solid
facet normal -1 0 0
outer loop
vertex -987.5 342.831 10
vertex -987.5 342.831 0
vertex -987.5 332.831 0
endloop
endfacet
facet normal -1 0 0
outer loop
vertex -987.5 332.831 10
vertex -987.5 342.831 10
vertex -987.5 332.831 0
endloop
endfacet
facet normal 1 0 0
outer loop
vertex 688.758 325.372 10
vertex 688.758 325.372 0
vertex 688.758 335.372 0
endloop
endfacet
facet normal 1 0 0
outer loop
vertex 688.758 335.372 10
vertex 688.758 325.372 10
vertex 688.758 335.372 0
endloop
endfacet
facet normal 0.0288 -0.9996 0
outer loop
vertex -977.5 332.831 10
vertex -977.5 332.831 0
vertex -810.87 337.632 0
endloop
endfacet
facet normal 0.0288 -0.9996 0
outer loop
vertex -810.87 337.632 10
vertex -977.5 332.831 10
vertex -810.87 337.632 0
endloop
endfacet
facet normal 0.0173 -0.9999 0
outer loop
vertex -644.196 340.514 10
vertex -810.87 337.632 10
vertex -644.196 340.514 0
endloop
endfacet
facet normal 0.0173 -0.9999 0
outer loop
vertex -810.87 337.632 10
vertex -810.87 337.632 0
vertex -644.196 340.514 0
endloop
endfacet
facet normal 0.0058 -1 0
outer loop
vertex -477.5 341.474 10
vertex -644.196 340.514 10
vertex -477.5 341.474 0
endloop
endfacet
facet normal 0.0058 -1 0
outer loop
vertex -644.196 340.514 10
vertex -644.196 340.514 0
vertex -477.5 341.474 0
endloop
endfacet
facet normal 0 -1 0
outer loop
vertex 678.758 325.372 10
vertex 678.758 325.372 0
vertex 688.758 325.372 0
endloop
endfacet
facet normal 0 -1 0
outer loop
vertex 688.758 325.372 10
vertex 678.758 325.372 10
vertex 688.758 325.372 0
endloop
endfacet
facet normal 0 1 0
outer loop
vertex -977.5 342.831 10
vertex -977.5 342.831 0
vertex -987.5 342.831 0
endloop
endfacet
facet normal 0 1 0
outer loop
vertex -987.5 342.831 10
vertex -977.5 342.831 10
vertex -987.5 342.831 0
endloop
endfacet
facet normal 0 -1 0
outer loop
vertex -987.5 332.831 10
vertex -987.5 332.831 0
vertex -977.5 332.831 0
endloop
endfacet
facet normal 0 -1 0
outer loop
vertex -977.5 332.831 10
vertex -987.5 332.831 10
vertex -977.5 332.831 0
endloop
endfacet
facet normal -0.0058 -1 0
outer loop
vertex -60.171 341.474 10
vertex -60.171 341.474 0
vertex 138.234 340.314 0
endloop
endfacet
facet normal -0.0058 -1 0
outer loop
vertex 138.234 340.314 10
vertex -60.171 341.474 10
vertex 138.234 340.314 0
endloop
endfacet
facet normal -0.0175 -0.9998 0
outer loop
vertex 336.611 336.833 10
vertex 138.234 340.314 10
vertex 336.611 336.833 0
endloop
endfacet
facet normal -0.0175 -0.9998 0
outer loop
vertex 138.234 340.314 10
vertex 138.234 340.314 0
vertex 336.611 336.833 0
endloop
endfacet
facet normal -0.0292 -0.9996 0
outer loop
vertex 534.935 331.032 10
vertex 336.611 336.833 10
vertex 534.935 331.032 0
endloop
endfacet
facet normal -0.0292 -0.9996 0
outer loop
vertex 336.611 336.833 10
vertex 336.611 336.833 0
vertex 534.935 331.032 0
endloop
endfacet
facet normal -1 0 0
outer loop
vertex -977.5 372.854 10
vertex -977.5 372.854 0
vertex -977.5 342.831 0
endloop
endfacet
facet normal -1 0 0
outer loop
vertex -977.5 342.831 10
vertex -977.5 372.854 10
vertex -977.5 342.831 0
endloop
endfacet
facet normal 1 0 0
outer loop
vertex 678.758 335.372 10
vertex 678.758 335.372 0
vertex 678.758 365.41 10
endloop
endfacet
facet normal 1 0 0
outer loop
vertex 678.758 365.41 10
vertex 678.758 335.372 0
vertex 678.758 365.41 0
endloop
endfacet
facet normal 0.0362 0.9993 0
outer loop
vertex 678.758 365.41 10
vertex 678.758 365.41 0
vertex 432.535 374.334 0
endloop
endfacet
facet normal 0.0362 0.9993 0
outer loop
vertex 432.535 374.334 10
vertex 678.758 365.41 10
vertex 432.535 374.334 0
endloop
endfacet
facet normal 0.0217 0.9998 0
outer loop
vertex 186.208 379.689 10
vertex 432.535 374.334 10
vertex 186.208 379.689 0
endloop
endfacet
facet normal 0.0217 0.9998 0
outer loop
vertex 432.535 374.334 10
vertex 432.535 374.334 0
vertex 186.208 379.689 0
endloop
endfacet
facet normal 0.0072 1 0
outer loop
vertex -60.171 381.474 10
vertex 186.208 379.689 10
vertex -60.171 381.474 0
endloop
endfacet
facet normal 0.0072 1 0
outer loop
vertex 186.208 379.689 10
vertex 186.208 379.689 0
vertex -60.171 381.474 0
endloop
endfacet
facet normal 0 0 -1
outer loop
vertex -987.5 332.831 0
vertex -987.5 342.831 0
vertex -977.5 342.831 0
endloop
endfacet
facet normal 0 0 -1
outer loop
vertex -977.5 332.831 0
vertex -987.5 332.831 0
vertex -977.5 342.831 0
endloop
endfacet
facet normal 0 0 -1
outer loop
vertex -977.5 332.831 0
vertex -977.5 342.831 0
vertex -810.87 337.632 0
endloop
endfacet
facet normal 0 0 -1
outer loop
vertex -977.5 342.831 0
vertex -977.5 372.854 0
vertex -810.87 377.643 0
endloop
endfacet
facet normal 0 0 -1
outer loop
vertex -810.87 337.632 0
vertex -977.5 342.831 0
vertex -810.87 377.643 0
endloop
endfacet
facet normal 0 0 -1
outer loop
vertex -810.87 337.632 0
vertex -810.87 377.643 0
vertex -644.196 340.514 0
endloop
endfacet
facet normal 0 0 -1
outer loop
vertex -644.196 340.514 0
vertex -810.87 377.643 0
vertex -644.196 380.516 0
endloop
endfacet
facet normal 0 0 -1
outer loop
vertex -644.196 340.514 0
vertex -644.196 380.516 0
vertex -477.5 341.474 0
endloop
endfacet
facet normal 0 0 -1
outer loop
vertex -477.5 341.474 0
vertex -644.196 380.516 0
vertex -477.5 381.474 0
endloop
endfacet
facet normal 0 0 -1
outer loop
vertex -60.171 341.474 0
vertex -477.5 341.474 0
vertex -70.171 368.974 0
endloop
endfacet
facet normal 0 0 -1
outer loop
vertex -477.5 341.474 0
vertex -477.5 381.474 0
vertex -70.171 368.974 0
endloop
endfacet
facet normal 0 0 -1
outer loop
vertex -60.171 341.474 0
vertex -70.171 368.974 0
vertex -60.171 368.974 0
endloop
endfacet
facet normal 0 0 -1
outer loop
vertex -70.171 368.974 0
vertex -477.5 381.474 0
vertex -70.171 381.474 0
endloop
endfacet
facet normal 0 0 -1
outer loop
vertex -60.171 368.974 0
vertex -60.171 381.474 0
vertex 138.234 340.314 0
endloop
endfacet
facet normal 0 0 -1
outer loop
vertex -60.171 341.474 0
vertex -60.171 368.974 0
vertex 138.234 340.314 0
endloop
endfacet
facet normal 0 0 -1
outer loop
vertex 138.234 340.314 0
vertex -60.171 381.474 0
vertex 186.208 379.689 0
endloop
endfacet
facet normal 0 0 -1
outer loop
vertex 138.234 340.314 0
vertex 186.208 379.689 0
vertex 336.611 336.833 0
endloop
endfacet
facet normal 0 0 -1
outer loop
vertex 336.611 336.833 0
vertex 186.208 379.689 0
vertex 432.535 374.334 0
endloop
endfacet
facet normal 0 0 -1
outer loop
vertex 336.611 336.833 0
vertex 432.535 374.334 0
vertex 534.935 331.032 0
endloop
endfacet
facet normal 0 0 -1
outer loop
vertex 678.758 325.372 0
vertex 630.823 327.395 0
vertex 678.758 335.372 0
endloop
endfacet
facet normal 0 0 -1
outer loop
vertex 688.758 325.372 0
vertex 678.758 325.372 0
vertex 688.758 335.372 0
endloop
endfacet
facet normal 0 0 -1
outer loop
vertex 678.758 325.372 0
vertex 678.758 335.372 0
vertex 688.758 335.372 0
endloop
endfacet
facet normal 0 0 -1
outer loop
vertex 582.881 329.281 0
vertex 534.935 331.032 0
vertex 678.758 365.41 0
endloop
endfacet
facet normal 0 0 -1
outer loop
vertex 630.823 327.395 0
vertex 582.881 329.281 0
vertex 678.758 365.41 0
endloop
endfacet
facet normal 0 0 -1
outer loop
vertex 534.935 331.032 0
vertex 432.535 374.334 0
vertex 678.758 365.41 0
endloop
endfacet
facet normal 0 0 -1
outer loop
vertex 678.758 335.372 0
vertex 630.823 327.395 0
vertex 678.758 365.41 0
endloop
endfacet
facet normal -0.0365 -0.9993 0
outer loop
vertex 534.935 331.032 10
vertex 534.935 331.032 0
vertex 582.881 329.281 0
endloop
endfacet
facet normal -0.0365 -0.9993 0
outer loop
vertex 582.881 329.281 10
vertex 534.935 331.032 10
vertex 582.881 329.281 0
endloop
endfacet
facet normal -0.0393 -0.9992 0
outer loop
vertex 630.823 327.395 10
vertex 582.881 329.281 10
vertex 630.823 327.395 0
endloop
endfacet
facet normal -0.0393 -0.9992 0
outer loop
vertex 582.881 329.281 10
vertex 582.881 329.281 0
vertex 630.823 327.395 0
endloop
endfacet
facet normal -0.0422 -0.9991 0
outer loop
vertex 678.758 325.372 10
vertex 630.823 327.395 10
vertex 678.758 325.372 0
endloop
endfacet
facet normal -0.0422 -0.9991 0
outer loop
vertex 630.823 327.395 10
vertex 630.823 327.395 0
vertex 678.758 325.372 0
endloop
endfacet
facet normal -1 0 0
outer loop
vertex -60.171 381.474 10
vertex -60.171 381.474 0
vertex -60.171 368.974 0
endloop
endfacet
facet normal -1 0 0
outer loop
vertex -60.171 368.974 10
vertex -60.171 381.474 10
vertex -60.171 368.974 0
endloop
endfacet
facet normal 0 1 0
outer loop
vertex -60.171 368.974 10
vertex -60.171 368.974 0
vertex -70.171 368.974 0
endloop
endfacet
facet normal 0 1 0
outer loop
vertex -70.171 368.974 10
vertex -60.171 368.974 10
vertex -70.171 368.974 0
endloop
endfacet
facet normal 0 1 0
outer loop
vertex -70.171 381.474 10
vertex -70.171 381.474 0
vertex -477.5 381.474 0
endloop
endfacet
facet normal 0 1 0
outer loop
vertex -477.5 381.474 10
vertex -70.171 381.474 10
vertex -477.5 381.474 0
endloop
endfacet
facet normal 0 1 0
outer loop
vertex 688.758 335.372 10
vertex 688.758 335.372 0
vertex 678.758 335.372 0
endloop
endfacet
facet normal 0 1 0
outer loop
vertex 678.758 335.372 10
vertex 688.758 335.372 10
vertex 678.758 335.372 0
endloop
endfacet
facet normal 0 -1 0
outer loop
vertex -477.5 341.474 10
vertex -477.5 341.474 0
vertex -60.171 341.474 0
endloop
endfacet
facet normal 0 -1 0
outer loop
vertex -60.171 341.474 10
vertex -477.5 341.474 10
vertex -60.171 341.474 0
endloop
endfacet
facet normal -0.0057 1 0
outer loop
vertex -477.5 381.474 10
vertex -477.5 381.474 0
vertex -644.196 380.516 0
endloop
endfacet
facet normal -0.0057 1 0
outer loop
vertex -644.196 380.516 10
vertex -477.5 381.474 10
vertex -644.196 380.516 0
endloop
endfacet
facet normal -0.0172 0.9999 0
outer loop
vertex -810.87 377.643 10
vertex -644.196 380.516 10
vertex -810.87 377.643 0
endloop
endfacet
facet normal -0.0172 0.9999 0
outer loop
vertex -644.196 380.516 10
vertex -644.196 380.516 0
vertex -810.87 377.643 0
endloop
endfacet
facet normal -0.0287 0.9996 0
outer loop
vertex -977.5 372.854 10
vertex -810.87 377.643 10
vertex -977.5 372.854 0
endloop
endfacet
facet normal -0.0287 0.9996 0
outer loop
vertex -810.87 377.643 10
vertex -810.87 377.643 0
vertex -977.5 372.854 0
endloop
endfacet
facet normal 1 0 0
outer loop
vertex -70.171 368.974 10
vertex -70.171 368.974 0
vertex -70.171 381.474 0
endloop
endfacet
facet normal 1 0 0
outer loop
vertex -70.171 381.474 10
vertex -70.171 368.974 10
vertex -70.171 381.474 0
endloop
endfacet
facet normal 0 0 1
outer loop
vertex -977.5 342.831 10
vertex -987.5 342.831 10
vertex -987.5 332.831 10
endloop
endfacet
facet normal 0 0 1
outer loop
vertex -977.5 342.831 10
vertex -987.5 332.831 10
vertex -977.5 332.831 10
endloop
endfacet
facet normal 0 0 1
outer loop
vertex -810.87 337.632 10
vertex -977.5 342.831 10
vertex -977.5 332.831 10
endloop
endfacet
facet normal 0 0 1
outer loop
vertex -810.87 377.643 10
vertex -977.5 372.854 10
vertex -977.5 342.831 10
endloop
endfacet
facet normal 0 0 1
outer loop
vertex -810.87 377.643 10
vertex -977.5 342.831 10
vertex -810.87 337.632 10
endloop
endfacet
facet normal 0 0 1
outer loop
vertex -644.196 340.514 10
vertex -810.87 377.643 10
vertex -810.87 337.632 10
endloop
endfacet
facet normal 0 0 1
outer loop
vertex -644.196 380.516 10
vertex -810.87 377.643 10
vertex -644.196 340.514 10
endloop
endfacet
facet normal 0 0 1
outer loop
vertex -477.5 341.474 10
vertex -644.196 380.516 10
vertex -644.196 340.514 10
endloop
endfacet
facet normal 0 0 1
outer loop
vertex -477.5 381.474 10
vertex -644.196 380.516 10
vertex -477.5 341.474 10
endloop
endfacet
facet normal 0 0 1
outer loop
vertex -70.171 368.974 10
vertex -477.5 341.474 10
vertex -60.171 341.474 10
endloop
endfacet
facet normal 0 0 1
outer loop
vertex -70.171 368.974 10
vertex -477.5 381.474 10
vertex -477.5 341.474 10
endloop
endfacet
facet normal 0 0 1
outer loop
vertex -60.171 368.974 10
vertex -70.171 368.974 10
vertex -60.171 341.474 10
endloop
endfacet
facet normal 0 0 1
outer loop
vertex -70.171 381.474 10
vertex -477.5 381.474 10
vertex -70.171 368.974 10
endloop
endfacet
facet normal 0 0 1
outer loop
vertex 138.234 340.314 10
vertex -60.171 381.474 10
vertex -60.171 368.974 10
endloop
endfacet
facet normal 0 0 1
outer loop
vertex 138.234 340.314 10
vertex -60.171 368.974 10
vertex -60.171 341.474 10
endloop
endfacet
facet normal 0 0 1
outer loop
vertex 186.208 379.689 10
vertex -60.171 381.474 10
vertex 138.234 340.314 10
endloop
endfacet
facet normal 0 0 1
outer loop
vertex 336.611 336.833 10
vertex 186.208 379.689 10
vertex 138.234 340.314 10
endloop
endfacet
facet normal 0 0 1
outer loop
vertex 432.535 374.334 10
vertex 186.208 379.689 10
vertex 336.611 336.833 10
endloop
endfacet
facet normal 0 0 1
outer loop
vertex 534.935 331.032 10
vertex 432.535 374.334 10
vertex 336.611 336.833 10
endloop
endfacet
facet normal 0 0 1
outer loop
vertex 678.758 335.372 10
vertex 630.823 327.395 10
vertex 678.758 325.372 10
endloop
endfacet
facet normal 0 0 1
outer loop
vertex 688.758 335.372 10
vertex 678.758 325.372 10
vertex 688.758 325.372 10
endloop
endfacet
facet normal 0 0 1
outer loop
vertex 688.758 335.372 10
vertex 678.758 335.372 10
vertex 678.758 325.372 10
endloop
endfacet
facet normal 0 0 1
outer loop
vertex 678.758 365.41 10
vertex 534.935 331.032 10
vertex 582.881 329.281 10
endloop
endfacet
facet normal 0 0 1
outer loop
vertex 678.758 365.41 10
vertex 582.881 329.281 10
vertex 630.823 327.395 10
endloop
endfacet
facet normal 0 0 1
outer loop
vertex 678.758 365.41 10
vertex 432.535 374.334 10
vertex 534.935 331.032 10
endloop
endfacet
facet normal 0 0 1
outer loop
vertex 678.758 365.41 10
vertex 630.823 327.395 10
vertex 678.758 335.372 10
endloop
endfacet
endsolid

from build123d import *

# Parameters (mm, degrees)
BOSS_EXTRUDE1_DEPTH = 10


with BuildPart() as part:
    # Sketch1 → Boss-Extrude1 (new body)
    with BuildSketch(Plane.XY):
        with BuildLine():
            Line((-70.170888572, 381.474129778), (-477.5, 381.474129778))
            ThreePointArc((-477.5, 381.474129778), (-727.537146474, 379.319055722), (-977.5, 372.854473884))
            Line((-977.5, 372.854473884), (-977.5, 342.830625486))
            Line((-977.5, 342.830625486), (-987.5, 342.830625486))
            Line((-987.5, 342.830625486), (-987.5, 332.830625486))
            Line((-987.5, 332.830625486), (-977.5, 332.830625486))
            ThreePointArc((-977.5, 332.830625486), (-727.537352293, 339.31309229), (-477.5, 341.474129778))
            Line((-477.5, 341.474129778), (-60.170888572, 341.474129778))
            ThreePointArc((-60.170888572, 341.474129778), (237.427772245, 338.863423493), (534.934829654, 331.032108233))
            ThreePointArc((534.934829654, 331.032108233), (606.852618205, 328.354762156), (678.758400695, 325.372324122))
            Line((678.758400695, 325.372324122), (688.758400695, 325.372324122))
            Line((688.758400695, 325.372324122), (688.758400695, 335.372324122))
            Line((688.758400695, 335.372324122), (678.758400695, 335.372324122))
            Line((678.758400695, 335.372324122), (678.758400695, 365.410239494))
            ThreePointArc((678.758400695, 365.410239494), (309.381050642, 377.45768283), (-60.170888572, 381.474129778))
            Line((-60.170888572, 381.474129778), (-60.170888572, 368.974129778))
            Line((-60.170888572, 368.974129778), (-70.170888572, 368.974129778))
            Line((-70.170888572, 368.974129778), (-70.170888572, 381.474129778))
        make_face()
    extrude(amount=BOSS_EXTRUDE1_DEPTH)


solid = part.part
